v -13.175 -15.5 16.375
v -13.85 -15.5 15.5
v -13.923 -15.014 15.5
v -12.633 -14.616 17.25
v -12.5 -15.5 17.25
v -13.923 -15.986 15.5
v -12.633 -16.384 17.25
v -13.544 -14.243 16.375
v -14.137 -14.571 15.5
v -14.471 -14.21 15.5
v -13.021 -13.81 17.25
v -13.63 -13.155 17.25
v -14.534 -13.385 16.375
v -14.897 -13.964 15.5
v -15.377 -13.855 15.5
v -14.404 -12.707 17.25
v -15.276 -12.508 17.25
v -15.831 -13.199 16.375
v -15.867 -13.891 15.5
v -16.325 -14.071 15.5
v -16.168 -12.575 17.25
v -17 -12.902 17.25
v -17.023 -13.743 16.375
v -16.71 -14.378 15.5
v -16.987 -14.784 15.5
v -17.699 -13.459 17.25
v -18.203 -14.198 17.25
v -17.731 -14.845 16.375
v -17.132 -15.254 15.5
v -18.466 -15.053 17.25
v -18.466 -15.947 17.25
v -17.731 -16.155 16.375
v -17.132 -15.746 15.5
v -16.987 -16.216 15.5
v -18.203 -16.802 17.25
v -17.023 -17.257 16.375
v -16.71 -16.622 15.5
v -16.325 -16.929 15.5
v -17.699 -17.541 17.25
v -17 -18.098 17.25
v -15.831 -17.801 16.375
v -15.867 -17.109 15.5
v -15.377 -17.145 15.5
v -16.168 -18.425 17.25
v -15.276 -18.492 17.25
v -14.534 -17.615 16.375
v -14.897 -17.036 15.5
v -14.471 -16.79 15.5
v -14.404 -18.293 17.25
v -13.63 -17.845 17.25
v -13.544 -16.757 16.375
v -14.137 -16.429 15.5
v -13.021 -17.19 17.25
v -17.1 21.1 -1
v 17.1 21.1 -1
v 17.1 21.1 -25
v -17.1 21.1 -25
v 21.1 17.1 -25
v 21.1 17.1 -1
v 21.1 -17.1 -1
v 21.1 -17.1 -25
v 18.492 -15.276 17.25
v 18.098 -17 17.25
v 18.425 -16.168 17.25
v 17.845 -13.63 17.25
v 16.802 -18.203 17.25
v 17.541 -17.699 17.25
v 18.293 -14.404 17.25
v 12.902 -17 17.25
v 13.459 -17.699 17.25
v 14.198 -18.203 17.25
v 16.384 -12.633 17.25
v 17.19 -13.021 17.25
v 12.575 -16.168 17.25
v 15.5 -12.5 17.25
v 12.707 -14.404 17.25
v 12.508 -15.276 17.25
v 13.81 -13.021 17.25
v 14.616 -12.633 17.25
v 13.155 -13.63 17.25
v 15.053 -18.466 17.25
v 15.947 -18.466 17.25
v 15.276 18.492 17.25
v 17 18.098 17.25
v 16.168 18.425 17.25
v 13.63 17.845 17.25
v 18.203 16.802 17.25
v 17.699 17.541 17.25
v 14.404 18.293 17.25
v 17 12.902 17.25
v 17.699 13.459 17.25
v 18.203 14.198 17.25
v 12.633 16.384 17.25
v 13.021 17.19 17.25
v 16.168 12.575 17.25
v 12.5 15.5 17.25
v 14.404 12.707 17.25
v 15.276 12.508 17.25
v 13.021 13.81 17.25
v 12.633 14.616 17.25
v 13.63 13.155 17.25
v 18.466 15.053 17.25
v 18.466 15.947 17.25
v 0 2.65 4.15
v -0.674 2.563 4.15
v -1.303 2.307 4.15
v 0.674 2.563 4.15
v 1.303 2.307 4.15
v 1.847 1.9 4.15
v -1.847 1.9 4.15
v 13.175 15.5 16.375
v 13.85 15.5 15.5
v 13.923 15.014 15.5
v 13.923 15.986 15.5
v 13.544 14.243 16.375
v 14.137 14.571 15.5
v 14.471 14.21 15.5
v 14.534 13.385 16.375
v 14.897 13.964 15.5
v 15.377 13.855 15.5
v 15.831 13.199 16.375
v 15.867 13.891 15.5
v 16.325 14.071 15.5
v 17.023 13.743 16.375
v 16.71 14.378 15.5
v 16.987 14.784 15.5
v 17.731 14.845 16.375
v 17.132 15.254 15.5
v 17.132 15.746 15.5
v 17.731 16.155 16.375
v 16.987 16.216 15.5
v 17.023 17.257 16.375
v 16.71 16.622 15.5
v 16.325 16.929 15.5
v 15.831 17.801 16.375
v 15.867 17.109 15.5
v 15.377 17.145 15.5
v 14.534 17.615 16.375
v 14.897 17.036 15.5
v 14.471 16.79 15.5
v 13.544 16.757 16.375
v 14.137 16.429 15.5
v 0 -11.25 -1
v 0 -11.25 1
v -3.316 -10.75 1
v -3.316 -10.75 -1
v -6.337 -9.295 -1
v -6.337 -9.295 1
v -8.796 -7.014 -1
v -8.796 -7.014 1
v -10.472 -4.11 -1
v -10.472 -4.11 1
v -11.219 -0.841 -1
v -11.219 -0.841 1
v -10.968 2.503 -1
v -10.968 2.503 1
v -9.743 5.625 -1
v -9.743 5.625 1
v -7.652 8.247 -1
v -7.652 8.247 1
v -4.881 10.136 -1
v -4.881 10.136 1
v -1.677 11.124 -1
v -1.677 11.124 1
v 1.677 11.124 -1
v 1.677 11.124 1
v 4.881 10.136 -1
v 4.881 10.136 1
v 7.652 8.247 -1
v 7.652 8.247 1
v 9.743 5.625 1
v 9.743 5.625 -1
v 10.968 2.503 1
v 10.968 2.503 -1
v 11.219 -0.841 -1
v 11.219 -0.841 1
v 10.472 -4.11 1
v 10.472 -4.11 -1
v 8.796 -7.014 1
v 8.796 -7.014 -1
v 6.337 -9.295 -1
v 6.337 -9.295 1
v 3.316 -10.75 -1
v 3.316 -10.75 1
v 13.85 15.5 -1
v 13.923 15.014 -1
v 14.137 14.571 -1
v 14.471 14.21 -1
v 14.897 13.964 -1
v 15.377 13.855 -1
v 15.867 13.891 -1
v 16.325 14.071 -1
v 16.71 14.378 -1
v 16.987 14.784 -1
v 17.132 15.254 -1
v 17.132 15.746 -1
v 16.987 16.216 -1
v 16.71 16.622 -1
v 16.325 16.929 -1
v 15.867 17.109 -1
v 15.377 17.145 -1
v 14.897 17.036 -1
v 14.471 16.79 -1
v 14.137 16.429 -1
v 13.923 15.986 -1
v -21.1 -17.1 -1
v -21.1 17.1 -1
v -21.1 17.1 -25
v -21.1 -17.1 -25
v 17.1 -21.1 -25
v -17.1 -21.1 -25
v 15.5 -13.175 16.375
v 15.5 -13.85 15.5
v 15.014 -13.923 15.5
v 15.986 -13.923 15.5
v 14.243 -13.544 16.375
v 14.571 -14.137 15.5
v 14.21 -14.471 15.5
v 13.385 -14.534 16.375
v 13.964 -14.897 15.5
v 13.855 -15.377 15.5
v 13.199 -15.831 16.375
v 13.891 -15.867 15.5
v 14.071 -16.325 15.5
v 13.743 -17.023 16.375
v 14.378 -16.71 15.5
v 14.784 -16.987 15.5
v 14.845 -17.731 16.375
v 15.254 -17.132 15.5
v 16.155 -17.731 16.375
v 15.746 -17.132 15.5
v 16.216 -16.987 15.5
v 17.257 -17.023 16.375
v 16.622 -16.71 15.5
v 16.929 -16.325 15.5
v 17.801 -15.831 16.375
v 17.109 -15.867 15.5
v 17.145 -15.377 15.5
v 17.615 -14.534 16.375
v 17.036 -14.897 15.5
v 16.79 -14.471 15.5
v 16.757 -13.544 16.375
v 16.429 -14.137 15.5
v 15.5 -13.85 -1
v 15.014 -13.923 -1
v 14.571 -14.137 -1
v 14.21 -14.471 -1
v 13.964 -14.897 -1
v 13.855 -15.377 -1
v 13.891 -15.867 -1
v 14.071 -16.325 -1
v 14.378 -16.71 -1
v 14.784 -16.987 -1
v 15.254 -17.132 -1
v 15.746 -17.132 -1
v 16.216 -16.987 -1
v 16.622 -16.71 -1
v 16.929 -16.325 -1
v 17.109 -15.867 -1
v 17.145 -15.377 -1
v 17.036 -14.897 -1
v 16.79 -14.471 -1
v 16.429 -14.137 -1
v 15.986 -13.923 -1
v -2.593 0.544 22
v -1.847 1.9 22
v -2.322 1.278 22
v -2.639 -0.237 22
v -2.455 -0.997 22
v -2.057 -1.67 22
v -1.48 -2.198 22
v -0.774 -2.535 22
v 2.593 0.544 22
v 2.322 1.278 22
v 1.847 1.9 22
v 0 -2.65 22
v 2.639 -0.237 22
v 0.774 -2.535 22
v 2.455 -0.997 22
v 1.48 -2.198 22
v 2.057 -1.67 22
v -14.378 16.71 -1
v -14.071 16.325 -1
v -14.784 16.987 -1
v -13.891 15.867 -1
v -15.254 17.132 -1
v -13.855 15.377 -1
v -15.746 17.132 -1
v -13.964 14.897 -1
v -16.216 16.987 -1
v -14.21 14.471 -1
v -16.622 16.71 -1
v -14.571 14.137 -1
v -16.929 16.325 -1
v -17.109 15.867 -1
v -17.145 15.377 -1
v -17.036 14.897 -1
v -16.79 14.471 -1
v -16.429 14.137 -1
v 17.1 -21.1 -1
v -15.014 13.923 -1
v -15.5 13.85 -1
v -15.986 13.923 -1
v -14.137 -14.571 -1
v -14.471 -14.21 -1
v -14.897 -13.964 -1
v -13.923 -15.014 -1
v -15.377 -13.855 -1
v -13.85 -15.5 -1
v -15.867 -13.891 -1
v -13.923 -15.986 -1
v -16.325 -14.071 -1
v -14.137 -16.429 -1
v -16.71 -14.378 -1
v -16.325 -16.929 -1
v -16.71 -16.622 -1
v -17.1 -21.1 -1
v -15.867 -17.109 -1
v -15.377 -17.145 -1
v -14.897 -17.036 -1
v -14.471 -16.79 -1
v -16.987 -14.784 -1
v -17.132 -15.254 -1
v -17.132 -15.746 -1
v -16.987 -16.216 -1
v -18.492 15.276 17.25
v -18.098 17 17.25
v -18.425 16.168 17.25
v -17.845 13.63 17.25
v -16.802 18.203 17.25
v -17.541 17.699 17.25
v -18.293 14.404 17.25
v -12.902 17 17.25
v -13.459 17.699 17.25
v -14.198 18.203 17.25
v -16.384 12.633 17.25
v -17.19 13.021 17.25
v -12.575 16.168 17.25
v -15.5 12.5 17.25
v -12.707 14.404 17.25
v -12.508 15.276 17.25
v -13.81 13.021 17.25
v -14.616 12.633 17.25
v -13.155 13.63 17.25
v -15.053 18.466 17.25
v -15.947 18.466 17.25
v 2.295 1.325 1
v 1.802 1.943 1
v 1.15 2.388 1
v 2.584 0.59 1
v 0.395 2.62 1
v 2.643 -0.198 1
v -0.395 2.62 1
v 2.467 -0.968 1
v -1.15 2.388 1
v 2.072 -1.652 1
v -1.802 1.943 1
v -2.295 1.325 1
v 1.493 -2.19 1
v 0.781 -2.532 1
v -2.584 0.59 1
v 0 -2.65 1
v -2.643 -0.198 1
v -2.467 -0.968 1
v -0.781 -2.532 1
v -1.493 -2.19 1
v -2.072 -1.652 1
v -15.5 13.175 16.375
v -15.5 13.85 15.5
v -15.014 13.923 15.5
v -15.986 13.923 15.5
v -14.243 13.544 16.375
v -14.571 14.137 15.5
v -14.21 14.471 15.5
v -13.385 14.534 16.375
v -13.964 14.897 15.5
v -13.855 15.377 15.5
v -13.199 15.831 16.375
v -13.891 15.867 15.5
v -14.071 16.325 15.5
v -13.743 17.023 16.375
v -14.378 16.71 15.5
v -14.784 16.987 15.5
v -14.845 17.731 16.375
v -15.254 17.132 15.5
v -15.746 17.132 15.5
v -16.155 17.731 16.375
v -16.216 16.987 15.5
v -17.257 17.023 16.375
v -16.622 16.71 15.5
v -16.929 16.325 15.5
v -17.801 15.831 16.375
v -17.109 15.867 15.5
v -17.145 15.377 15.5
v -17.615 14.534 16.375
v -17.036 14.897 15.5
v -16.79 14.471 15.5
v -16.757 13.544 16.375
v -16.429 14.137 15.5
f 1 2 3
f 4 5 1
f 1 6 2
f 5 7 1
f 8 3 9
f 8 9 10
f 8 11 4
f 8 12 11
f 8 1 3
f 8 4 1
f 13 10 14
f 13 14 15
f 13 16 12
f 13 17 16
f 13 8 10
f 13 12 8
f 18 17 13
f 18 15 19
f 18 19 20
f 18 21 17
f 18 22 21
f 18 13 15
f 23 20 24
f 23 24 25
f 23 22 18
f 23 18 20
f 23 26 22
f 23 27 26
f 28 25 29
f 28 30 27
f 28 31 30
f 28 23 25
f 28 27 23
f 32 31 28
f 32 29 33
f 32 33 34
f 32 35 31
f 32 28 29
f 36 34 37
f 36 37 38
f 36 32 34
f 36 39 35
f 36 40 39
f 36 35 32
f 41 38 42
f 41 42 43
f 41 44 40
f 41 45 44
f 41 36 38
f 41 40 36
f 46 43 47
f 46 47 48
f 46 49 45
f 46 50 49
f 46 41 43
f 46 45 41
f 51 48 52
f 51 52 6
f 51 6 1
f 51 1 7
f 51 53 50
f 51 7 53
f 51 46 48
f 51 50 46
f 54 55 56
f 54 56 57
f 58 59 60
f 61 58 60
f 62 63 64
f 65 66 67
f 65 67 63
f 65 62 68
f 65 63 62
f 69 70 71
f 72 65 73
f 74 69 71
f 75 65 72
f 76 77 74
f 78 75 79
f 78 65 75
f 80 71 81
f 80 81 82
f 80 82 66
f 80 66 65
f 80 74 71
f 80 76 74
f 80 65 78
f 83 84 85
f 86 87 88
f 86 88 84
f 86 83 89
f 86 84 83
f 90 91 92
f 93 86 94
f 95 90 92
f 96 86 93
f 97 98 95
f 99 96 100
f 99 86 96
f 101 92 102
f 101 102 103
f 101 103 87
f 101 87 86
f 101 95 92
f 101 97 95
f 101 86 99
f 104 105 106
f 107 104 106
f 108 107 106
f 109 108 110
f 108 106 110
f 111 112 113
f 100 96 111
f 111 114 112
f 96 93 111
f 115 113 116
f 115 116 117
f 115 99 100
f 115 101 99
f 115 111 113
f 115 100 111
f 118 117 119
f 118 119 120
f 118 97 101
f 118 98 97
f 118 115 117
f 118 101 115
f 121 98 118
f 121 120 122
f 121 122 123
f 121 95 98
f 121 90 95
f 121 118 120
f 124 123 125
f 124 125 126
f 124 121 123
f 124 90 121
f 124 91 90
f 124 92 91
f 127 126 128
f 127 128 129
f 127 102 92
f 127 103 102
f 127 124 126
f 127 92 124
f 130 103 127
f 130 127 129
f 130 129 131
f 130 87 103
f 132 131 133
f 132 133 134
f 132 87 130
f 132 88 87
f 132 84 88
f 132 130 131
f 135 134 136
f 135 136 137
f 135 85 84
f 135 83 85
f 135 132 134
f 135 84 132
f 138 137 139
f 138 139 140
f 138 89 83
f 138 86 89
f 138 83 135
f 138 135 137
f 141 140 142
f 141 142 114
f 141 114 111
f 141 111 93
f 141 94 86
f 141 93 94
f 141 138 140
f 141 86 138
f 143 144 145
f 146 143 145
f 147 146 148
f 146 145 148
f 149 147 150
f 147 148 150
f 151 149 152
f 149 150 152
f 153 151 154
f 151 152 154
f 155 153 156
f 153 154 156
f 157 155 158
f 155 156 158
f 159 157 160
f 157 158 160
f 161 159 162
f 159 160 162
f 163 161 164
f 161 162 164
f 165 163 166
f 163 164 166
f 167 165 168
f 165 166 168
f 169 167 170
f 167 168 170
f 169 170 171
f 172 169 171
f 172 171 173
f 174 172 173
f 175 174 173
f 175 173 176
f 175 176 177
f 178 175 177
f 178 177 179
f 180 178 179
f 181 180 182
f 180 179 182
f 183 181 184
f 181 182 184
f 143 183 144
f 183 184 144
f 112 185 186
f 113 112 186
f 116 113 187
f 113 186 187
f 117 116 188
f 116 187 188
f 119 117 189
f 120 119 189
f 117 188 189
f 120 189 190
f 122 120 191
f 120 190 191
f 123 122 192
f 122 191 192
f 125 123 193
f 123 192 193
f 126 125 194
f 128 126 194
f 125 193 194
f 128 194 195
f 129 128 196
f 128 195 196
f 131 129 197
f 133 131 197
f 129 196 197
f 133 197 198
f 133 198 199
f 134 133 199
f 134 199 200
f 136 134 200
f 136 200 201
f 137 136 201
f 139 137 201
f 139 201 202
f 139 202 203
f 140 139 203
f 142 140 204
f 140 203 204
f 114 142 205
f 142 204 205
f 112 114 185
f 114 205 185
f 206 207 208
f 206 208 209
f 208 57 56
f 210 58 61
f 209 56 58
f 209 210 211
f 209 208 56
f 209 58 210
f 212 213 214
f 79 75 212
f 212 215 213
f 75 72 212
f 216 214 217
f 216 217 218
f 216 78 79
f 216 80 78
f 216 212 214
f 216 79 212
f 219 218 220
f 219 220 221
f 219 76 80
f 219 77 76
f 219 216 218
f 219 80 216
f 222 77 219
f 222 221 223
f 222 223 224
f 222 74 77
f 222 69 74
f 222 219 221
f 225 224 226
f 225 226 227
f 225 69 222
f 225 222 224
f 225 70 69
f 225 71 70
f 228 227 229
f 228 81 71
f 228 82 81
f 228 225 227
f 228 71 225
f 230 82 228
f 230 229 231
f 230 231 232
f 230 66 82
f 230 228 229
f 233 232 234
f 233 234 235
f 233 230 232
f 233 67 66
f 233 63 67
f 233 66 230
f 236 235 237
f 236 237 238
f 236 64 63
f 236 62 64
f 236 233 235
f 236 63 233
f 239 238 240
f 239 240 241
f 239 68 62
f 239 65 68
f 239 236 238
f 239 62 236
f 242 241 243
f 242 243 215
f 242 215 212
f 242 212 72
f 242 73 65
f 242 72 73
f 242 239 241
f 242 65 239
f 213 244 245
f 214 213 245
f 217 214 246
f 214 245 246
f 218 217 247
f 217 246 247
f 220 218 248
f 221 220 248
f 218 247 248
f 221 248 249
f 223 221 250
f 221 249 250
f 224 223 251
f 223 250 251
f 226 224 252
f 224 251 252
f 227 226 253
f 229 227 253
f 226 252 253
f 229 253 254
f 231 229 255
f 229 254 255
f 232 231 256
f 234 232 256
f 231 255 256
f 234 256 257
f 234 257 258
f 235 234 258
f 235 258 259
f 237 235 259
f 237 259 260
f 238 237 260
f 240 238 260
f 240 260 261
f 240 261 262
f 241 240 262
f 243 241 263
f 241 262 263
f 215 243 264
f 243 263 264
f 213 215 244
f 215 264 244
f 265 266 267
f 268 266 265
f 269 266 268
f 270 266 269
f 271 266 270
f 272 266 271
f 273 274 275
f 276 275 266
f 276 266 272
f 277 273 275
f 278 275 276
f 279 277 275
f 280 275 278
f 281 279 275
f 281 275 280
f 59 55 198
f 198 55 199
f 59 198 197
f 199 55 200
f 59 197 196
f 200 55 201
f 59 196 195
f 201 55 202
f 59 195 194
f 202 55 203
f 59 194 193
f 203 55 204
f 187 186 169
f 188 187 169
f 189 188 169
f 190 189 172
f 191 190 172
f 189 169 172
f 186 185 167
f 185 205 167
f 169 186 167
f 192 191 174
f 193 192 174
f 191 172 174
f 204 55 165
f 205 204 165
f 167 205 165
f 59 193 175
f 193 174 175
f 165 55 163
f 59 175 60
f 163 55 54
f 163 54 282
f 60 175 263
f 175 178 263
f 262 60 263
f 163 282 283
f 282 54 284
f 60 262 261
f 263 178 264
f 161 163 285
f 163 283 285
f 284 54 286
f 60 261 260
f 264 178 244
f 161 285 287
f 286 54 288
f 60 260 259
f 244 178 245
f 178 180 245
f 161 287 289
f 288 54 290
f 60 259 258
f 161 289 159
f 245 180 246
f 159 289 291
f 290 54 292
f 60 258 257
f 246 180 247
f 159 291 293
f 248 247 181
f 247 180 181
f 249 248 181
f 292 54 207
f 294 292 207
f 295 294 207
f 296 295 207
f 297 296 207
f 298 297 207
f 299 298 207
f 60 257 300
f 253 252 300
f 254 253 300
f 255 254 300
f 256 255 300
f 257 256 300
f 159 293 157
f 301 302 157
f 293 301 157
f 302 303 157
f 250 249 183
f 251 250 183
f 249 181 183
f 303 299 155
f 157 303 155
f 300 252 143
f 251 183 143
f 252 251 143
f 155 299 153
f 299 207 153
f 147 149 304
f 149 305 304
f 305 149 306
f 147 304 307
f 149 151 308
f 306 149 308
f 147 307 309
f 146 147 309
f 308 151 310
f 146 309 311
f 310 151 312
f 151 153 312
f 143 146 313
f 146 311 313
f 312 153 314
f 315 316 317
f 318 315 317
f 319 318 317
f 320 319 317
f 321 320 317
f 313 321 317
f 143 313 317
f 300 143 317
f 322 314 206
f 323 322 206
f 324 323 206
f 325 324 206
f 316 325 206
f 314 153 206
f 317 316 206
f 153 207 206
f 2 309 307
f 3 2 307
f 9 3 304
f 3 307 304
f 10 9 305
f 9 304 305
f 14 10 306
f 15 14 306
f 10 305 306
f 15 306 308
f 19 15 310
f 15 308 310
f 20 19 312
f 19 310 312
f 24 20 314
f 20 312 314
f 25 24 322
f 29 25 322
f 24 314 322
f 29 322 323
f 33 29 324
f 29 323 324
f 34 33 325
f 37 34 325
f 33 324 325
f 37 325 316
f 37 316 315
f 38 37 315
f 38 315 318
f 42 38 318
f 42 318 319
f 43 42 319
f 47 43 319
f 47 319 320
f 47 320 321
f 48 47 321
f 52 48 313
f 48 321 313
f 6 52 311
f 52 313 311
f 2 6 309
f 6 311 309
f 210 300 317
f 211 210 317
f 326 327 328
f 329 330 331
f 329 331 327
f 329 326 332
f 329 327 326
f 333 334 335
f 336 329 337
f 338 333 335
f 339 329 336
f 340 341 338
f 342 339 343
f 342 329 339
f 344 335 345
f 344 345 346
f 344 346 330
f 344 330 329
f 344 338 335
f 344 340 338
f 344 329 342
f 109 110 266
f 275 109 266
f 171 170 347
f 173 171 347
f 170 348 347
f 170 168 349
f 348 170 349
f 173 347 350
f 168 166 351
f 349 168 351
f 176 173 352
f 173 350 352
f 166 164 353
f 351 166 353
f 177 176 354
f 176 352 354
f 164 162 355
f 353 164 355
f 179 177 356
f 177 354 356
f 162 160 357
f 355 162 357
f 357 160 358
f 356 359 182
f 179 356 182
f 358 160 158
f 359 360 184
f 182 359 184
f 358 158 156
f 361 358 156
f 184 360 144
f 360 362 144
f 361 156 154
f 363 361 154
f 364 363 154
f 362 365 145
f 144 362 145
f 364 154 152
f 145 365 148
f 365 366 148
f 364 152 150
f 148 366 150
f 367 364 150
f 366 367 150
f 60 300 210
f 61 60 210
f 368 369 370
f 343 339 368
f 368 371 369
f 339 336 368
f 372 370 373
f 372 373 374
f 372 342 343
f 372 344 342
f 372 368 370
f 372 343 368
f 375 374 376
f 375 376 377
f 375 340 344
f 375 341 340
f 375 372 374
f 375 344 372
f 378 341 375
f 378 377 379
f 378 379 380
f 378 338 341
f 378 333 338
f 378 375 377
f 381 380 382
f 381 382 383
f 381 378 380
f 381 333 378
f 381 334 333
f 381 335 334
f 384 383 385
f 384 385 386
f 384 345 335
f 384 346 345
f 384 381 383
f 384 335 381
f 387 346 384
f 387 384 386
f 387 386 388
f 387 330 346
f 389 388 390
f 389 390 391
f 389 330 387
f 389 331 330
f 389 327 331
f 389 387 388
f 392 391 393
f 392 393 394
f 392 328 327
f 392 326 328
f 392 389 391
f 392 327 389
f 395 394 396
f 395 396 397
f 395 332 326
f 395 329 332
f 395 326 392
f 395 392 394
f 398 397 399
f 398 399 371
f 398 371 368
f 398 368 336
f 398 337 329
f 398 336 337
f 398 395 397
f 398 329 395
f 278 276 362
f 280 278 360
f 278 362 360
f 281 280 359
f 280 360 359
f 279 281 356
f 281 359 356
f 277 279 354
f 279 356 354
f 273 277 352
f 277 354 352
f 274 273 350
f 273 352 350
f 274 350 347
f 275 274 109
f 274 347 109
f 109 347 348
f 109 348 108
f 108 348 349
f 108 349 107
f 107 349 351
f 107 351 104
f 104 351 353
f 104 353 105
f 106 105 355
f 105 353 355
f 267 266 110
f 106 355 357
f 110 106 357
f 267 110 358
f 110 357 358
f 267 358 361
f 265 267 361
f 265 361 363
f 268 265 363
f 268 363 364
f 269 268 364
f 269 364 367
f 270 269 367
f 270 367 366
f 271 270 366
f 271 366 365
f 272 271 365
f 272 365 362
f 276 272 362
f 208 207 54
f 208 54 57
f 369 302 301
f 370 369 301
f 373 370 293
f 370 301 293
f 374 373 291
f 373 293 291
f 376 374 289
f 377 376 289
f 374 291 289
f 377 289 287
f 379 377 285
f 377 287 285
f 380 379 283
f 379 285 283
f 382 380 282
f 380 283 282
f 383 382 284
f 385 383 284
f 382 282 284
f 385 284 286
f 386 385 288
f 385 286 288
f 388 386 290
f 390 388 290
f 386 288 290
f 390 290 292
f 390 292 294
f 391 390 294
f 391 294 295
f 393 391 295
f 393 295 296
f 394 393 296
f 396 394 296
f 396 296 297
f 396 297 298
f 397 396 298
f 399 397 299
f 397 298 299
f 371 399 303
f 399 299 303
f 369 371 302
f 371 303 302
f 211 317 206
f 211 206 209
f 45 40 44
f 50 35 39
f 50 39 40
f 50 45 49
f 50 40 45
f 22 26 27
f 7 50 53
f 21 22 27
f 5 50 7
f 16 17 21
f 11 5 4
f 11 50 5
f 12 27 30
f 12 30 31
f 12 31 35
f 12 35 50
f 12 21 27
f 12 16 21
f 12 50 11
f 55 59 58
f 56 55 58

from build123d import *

# Parameters (mm, degrees)
CYLINDER_R           = 2.65
CYLINDER_DEPTH       = 21
CYLINDER001_R        = 11.25
CYLINDER001_DEPTH    = 2
BOX_W                = 42.2
BOX_H                = 42.2
BOX_DEPTH            = 24
CHAMFER_SIZE         = 4
CYLINDER002_R        = 1.65
CYLINDER002_DEPTH    = 16.5
POLARPATTERN_COUNT   = 4
BOX001_W             = 17.85
BOX001_H             = 2.1
BOX001_DEPTH         = 5
BODY_PLACEMENT_ANGLE = 90


with BuildPart() as part:
    # Cylinder → Cylinder (join)
    with BuildSketch(Plane.XY):
        Circle(CYLINDER_R)
    extrude(amount=CYLINDER_DEPTH)

    # Cylinder001 → Cylinder001 (join)
    with BuildSketch(Plane(origin=(0, 0, 0), x_dir=(1, 0, 0), z_dir=(0, 0, -1))):
        Circle(CYLINDER001_R)
    extrude(amount=CYLINDER001_DEPTH)

    # Box → Box (join)
    with BuildSketch(Plane(origin=(-21.1, 21.1, -2), x_dir=(1, 0, 0), z_dir=(0, 0, -1))):
        with Locations((21.1, 21.1)):
            Rectangle(BOX_W, BOX_H)
    extrude(amount=BOX_DEPTH)

    # Chamfer
    chamfer_edges = [part.edges().sort_by_distance(p)[0] for p in [
        (-21.1, 21.1, -14),
        (-21.1, -21.1, -14),
        (21.1, -21.1, -14),
        (21.1, 21.1, -14),
    ]]
    chamfer(chamfer_edges, length=CHAMFER_SIZE)

    # Cylinder002 → Cylinder002 (join)
    with BuildSketch(Plane(origin=(-15.5, -15.5, -2), x_dir=(1, 0, 0), z_dir=(0, 0, 1))):
        Circle(CYLINDER002_R)
    cylinder002 = extrude(amount=CYLINDER002_DEPTH)

    # Cone → Cone (revolve)
    with BuildSketch(Plane(origin=(-15.5, -15.5, 14.5), x_dir=(1, 0, 0), z_dir=(0, -1, 0))):
        Polygon((0, 0), (1.65, 0), (3, 1.75), (0, 1.75), align=None)
    cone = revolve(axis=Axis((-15.5, -15.5, 14.5), (0, 0, 1)))

    # PolarPattern: Cylinder002, Cone ×4 about axis
    polarpattern_axis = Axis((0, 0, 0), (0, 0, 1))
    for i in range(1, POLARPATTERN_COUNT):
        add(cylinder002.rotate(polarpattern_axis, i * 360 / POLARPATTERN_COUNT))
        add(cone.rotate(polarpattern_axis, i * 360 / POLARPATTERN_COUNT))

    # Box001 → Box001 (cut)
    with BuildSketch(Plane(origin=(-4, -2.5, 3.15), x_dir=(0, 0, 1), z_dir=(0, 1, 0))):
        with Locations((8.925, 1.05)):
            Rectangle(BOX001_W, BOX001_H)
    extrude(amount=BOX001_DEPTH, mode=Mode.SUBTRACT)


with BuildPart() as part_1:
    # Body placement: moved
    add(part.part.moved(Location((0, 0, 1))).rotate(Axis((0, 0, 1), (0, 0, -1)), BODY_PLACEMENT_ANGLE))


solid = part_1.part
